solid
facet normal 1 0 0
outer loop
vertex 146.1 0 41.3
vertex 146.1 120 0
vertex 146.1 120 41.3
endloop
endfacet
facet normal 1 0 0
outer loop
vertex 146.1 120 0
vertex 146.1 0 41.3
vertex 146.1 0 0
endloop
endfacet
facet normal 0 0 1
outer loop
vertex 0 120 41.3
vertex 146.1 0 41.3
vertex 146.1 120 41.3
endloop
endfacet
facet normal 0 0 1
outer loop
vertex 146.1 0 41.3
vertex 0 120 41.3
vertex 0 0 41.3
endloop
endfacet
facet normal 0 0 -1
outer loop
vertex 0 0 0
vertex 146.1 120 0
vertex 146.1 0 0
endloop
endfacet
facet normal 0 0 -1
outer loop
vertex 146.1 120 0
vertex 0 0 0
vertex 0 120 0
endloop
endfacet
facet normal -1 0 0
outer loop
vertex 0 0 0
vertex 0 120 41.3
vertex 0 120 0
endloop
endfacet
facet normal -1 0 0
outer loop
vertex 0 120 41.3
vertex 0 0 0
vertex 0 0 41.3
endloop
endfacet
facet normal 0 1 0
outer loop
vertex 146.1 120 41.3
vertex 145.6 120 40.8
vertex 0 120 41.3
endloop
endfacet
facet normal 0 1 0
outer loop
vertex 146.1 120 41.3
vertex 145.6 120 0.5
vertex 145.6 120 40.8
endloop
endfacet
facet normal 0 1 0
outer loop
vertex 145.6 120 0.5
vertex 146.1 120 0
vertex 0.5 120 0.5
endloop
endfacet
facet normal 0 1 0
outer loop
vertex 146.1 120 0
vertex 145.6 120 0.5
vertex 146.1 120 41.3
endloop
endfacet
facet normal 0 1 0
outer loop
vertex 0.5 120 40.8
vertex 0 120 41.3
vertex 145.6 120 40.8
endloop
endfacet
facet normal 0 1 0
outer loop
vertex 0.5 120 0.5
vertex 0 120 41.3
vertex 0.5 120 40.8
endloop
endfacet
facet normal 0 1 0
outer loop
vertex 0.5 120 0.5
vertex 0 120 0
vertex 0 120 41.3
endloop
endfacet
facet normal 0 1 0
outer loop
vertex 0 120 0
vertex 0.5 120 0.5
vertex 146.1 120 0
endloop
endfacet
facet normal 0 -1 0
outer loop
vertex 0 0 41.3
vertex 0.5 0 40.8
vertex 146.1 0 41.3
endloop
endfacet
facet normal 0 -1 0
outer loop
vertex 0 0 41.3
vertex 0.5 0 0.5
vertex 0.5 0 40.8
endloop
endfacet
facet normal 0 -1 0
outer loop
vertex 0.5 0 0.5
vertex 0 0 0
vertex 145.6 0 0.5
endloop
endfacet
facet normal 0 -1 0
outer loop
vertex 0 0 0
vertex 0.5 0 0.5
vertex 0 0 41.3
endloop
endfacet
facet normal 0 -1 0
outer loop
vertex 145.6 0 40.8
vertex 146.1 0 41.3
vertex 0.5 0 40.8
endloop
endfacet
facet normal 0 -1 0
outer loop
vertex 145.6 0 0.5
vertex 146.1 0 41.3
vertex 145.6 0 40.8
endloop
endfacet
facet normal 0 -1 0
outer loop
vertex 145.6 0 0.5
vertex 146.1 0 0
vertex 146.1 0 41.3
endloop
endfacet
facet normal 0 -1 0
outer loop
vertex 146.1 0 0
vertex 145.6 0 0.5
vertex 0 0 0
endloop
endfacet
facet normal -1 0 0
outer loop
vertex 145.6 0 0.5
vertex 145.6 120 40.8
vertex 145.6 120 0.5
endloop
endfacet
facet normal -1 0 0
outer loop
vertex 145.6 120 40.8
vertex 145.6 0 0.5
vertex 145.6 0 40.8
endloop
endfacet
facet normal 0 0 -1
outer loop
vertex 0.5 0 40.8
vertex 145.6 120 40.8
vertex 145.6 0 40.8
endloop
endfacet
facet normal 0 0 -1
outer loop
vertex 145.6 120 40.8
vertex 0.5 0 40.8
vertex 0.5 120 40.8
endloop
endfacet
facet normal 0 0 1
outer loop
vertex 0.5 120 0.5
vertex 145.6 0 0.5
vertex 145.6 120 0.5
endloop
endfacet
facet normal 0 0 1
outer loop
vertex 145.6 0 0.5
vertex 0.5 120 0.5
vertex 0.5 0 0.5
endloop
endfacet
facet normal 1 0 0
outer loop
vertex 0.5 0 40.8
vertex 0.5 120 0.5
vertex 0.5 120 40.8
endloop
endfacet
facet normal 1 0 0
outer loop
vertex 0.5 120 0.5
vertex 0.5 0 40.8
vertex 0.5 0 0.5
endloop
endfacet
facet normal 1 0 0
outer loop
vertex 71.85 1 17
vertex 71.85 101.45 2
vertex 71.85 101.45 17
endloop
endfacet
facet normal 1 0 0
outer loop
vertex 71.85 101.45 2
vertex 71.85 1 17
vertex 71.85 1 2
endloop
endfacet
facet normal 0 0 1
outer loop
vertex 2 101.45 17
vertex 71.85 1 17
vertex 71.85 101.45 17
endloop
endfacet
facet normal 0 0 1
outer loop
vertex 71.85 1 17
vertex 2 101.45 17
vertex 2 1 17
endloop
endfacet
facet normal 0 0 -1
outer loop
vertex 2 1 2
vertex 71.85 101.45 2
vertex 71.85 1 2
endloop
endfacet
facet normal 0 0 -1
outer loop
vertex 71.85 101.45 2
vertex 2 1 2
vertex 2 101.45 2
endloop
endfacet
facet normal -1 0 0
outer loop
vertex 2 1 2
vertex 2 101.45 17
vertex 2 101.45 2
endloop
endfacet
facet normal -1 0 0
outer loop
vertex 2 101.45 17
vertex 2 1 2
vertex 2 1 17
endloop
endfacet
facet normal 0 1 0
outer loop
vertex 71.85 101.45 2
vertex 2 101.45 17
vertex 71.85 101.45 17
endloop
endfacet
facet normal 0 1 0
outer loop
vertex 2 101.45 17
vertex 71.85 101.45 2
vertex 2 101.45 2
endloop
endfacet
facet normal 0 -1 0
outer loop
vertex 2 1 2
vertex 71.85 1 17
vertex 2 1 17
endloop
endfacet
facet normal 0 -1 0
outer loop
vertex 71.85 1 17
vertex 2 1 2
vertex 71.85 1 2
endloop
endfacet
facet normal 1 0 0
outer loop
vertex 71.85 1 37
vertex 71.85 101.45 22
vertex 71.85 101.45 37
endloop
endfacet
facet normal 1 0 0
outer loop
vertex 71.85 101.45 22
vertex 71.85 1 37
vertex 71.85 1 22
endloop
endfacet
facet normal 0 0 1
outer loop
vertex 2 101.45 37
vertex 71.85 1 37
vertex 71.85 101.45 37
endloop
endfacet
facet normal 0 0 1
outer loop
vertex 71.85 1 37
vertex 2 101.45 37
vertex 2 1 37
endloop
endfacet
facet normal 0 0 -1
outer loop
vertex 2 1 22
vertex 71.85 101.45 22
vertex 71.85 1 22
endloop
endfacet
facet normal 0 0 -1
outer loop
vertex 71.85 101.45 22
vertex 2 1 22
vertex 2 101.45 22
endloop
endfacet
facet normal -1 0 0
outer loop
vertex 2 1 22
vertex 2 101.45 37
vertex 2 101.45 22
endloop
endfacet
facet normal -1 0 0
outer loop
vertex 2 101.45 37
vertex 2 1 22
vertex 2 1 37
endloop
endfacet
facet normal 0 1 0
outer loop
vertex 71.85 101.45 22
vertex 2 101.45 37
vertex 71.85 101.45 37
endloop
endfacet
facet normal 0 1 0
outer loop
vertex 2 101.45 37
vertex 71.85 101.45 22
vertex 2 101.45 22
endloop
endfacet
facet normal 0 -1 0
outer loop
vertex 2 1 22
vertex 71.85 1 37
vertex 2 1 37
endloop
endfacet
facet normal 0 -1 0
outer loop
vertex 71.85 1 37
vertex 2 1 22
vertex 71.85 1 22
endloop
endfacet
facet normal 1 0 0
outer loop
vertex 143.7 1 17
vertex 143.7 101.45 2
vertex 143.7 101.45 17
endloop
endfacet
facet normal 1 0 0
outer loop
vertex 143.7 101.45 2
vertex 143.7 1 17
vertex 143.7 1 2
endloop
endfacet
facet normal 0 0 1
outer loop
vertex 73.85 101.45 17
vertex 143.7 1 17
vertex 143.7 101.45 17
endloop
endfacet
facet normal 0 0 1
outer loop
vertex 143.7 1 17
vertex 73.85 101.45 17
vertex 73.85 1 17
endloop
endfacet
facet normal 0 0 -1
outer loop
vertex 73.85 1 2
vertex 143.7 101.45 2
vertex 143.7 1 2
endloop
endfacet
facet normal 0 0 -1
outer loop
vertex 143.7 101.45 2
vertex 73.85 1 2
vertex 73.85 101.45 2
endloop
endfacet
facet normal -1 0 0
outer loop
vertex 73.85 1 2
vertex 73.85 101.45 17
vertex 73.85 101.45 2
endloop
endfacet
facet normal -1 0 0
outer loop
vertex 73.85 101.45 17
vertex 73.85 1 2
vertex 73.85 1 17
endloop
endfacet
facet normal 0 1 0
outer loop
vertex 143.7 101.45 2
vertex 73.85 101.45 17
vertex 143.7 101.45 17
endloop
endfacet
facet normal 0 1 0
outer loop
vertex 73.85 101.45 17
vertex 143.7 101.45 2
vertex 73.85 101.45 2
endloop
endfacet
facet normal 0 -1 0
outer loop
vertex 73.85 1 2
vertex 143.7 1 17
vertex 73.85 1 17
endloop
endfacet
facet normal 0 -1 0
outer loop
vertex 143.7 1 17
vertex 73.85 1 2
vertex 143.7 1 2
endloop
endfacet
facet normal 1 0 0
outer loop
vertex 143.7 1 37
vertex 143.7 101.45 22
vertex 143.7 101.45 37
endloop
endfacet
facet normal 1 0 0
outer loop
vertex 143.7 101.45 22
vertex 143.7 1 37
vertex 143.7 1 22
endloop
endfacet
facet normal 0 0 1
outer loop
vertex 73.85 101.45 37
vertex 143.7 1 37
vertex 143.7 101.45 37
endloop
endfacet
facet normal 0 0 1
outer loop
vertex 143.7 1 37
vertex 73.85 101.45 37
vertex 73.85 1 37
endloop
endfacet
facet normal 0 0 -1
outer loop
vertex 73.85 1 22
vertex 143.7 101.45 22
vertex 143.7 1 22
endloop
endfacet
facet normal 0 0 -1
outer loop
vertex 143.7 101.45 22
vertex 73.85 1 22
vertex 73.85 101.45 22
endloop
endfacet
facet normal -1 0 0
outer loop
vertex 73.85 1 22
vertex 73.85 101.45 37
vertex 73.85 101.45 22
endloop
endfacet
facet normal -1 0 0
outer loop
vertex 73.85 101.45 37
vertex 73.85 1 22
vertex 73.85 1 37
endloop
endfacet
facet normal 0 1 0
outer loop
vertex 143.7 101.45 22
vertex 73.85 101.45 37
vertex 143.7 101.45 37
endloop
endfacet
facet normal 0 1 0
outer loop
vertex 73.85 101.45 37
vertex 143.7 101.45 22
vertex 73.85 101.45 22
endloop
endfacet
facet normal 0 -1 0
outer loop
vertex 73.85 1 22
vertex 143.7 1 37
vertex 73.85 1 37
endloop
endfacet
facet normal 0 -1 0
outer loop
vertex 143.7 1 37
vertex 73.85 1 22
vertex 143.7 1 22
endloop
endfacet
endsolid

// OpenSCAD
    // Legger inn denne som 15mm, siden det finnes disker som er så høye.
module disk(trans = [0,0,0], height=15) {
    translate(trans) {
        cube([69.85,100.45,height]);
    }
}

// Standarddybde er 203.2mm, men det er det kanskje greit å skjære av i blant.
module ramme(trans = [0,0,0], depth = 203.2) {
    translate(trans) {
        difference() {
            cube([146.1,depth,41.3]);
            translate([0.5,0,0.5]) {
                cube([145.1,depth,40.3]);
            }
        }
    }
}

// Hvis vi har 15mm høye disker (ikke så vanlig)
module 4disk(trans = [0,0,0]) {
    translate(trans) {
        disk(trans = [2,1,2]);
        disk(trans = [2,1,22]);
        disk(trans = [73.85,1,2]);
        disk(trans = [73.85,1,22]);
    }
}

// Hvis vi har 9mm høye disker (vanlig)
module 6disk(trans = [0,0,0]) {
    translate(trans) {
        disk(height = 9, trans = [2,1,2]);
        disk(height = 9, trans = [2,1,15]);
        disk(height = 9, trans = [2,1,28]);
        disk(height = 9, trans = [73.85,1,2]);
        disk(height = 9, trans = [73.85,1,15]);
        disk(height = 9, trans = [73.85,1,28]);
    }
}

// Hvis vi har 5mm høye disker (vanlig på SSD-er)
module 8disk(trans = [0,0,0]) {
    translate(trans) {
        disk(height = 5, trans = [2,1,2]);
        disk(height = 5, trans = [2,1,12]);
        disk(height = 5, trans = [2,1,22]);
        disk(height = 5, trans = [2,1,31]);
        disk(height = 5, trans = [73.85,1,2]);
        disk(height = 5, trans = [73.85,1,12]);
        disk(height = 5, trans = [73.85,1,22]);
        disk(height = 5, trans = [73.85,1,31]);
    }
}

ramme(depth = 120);
4disk();
